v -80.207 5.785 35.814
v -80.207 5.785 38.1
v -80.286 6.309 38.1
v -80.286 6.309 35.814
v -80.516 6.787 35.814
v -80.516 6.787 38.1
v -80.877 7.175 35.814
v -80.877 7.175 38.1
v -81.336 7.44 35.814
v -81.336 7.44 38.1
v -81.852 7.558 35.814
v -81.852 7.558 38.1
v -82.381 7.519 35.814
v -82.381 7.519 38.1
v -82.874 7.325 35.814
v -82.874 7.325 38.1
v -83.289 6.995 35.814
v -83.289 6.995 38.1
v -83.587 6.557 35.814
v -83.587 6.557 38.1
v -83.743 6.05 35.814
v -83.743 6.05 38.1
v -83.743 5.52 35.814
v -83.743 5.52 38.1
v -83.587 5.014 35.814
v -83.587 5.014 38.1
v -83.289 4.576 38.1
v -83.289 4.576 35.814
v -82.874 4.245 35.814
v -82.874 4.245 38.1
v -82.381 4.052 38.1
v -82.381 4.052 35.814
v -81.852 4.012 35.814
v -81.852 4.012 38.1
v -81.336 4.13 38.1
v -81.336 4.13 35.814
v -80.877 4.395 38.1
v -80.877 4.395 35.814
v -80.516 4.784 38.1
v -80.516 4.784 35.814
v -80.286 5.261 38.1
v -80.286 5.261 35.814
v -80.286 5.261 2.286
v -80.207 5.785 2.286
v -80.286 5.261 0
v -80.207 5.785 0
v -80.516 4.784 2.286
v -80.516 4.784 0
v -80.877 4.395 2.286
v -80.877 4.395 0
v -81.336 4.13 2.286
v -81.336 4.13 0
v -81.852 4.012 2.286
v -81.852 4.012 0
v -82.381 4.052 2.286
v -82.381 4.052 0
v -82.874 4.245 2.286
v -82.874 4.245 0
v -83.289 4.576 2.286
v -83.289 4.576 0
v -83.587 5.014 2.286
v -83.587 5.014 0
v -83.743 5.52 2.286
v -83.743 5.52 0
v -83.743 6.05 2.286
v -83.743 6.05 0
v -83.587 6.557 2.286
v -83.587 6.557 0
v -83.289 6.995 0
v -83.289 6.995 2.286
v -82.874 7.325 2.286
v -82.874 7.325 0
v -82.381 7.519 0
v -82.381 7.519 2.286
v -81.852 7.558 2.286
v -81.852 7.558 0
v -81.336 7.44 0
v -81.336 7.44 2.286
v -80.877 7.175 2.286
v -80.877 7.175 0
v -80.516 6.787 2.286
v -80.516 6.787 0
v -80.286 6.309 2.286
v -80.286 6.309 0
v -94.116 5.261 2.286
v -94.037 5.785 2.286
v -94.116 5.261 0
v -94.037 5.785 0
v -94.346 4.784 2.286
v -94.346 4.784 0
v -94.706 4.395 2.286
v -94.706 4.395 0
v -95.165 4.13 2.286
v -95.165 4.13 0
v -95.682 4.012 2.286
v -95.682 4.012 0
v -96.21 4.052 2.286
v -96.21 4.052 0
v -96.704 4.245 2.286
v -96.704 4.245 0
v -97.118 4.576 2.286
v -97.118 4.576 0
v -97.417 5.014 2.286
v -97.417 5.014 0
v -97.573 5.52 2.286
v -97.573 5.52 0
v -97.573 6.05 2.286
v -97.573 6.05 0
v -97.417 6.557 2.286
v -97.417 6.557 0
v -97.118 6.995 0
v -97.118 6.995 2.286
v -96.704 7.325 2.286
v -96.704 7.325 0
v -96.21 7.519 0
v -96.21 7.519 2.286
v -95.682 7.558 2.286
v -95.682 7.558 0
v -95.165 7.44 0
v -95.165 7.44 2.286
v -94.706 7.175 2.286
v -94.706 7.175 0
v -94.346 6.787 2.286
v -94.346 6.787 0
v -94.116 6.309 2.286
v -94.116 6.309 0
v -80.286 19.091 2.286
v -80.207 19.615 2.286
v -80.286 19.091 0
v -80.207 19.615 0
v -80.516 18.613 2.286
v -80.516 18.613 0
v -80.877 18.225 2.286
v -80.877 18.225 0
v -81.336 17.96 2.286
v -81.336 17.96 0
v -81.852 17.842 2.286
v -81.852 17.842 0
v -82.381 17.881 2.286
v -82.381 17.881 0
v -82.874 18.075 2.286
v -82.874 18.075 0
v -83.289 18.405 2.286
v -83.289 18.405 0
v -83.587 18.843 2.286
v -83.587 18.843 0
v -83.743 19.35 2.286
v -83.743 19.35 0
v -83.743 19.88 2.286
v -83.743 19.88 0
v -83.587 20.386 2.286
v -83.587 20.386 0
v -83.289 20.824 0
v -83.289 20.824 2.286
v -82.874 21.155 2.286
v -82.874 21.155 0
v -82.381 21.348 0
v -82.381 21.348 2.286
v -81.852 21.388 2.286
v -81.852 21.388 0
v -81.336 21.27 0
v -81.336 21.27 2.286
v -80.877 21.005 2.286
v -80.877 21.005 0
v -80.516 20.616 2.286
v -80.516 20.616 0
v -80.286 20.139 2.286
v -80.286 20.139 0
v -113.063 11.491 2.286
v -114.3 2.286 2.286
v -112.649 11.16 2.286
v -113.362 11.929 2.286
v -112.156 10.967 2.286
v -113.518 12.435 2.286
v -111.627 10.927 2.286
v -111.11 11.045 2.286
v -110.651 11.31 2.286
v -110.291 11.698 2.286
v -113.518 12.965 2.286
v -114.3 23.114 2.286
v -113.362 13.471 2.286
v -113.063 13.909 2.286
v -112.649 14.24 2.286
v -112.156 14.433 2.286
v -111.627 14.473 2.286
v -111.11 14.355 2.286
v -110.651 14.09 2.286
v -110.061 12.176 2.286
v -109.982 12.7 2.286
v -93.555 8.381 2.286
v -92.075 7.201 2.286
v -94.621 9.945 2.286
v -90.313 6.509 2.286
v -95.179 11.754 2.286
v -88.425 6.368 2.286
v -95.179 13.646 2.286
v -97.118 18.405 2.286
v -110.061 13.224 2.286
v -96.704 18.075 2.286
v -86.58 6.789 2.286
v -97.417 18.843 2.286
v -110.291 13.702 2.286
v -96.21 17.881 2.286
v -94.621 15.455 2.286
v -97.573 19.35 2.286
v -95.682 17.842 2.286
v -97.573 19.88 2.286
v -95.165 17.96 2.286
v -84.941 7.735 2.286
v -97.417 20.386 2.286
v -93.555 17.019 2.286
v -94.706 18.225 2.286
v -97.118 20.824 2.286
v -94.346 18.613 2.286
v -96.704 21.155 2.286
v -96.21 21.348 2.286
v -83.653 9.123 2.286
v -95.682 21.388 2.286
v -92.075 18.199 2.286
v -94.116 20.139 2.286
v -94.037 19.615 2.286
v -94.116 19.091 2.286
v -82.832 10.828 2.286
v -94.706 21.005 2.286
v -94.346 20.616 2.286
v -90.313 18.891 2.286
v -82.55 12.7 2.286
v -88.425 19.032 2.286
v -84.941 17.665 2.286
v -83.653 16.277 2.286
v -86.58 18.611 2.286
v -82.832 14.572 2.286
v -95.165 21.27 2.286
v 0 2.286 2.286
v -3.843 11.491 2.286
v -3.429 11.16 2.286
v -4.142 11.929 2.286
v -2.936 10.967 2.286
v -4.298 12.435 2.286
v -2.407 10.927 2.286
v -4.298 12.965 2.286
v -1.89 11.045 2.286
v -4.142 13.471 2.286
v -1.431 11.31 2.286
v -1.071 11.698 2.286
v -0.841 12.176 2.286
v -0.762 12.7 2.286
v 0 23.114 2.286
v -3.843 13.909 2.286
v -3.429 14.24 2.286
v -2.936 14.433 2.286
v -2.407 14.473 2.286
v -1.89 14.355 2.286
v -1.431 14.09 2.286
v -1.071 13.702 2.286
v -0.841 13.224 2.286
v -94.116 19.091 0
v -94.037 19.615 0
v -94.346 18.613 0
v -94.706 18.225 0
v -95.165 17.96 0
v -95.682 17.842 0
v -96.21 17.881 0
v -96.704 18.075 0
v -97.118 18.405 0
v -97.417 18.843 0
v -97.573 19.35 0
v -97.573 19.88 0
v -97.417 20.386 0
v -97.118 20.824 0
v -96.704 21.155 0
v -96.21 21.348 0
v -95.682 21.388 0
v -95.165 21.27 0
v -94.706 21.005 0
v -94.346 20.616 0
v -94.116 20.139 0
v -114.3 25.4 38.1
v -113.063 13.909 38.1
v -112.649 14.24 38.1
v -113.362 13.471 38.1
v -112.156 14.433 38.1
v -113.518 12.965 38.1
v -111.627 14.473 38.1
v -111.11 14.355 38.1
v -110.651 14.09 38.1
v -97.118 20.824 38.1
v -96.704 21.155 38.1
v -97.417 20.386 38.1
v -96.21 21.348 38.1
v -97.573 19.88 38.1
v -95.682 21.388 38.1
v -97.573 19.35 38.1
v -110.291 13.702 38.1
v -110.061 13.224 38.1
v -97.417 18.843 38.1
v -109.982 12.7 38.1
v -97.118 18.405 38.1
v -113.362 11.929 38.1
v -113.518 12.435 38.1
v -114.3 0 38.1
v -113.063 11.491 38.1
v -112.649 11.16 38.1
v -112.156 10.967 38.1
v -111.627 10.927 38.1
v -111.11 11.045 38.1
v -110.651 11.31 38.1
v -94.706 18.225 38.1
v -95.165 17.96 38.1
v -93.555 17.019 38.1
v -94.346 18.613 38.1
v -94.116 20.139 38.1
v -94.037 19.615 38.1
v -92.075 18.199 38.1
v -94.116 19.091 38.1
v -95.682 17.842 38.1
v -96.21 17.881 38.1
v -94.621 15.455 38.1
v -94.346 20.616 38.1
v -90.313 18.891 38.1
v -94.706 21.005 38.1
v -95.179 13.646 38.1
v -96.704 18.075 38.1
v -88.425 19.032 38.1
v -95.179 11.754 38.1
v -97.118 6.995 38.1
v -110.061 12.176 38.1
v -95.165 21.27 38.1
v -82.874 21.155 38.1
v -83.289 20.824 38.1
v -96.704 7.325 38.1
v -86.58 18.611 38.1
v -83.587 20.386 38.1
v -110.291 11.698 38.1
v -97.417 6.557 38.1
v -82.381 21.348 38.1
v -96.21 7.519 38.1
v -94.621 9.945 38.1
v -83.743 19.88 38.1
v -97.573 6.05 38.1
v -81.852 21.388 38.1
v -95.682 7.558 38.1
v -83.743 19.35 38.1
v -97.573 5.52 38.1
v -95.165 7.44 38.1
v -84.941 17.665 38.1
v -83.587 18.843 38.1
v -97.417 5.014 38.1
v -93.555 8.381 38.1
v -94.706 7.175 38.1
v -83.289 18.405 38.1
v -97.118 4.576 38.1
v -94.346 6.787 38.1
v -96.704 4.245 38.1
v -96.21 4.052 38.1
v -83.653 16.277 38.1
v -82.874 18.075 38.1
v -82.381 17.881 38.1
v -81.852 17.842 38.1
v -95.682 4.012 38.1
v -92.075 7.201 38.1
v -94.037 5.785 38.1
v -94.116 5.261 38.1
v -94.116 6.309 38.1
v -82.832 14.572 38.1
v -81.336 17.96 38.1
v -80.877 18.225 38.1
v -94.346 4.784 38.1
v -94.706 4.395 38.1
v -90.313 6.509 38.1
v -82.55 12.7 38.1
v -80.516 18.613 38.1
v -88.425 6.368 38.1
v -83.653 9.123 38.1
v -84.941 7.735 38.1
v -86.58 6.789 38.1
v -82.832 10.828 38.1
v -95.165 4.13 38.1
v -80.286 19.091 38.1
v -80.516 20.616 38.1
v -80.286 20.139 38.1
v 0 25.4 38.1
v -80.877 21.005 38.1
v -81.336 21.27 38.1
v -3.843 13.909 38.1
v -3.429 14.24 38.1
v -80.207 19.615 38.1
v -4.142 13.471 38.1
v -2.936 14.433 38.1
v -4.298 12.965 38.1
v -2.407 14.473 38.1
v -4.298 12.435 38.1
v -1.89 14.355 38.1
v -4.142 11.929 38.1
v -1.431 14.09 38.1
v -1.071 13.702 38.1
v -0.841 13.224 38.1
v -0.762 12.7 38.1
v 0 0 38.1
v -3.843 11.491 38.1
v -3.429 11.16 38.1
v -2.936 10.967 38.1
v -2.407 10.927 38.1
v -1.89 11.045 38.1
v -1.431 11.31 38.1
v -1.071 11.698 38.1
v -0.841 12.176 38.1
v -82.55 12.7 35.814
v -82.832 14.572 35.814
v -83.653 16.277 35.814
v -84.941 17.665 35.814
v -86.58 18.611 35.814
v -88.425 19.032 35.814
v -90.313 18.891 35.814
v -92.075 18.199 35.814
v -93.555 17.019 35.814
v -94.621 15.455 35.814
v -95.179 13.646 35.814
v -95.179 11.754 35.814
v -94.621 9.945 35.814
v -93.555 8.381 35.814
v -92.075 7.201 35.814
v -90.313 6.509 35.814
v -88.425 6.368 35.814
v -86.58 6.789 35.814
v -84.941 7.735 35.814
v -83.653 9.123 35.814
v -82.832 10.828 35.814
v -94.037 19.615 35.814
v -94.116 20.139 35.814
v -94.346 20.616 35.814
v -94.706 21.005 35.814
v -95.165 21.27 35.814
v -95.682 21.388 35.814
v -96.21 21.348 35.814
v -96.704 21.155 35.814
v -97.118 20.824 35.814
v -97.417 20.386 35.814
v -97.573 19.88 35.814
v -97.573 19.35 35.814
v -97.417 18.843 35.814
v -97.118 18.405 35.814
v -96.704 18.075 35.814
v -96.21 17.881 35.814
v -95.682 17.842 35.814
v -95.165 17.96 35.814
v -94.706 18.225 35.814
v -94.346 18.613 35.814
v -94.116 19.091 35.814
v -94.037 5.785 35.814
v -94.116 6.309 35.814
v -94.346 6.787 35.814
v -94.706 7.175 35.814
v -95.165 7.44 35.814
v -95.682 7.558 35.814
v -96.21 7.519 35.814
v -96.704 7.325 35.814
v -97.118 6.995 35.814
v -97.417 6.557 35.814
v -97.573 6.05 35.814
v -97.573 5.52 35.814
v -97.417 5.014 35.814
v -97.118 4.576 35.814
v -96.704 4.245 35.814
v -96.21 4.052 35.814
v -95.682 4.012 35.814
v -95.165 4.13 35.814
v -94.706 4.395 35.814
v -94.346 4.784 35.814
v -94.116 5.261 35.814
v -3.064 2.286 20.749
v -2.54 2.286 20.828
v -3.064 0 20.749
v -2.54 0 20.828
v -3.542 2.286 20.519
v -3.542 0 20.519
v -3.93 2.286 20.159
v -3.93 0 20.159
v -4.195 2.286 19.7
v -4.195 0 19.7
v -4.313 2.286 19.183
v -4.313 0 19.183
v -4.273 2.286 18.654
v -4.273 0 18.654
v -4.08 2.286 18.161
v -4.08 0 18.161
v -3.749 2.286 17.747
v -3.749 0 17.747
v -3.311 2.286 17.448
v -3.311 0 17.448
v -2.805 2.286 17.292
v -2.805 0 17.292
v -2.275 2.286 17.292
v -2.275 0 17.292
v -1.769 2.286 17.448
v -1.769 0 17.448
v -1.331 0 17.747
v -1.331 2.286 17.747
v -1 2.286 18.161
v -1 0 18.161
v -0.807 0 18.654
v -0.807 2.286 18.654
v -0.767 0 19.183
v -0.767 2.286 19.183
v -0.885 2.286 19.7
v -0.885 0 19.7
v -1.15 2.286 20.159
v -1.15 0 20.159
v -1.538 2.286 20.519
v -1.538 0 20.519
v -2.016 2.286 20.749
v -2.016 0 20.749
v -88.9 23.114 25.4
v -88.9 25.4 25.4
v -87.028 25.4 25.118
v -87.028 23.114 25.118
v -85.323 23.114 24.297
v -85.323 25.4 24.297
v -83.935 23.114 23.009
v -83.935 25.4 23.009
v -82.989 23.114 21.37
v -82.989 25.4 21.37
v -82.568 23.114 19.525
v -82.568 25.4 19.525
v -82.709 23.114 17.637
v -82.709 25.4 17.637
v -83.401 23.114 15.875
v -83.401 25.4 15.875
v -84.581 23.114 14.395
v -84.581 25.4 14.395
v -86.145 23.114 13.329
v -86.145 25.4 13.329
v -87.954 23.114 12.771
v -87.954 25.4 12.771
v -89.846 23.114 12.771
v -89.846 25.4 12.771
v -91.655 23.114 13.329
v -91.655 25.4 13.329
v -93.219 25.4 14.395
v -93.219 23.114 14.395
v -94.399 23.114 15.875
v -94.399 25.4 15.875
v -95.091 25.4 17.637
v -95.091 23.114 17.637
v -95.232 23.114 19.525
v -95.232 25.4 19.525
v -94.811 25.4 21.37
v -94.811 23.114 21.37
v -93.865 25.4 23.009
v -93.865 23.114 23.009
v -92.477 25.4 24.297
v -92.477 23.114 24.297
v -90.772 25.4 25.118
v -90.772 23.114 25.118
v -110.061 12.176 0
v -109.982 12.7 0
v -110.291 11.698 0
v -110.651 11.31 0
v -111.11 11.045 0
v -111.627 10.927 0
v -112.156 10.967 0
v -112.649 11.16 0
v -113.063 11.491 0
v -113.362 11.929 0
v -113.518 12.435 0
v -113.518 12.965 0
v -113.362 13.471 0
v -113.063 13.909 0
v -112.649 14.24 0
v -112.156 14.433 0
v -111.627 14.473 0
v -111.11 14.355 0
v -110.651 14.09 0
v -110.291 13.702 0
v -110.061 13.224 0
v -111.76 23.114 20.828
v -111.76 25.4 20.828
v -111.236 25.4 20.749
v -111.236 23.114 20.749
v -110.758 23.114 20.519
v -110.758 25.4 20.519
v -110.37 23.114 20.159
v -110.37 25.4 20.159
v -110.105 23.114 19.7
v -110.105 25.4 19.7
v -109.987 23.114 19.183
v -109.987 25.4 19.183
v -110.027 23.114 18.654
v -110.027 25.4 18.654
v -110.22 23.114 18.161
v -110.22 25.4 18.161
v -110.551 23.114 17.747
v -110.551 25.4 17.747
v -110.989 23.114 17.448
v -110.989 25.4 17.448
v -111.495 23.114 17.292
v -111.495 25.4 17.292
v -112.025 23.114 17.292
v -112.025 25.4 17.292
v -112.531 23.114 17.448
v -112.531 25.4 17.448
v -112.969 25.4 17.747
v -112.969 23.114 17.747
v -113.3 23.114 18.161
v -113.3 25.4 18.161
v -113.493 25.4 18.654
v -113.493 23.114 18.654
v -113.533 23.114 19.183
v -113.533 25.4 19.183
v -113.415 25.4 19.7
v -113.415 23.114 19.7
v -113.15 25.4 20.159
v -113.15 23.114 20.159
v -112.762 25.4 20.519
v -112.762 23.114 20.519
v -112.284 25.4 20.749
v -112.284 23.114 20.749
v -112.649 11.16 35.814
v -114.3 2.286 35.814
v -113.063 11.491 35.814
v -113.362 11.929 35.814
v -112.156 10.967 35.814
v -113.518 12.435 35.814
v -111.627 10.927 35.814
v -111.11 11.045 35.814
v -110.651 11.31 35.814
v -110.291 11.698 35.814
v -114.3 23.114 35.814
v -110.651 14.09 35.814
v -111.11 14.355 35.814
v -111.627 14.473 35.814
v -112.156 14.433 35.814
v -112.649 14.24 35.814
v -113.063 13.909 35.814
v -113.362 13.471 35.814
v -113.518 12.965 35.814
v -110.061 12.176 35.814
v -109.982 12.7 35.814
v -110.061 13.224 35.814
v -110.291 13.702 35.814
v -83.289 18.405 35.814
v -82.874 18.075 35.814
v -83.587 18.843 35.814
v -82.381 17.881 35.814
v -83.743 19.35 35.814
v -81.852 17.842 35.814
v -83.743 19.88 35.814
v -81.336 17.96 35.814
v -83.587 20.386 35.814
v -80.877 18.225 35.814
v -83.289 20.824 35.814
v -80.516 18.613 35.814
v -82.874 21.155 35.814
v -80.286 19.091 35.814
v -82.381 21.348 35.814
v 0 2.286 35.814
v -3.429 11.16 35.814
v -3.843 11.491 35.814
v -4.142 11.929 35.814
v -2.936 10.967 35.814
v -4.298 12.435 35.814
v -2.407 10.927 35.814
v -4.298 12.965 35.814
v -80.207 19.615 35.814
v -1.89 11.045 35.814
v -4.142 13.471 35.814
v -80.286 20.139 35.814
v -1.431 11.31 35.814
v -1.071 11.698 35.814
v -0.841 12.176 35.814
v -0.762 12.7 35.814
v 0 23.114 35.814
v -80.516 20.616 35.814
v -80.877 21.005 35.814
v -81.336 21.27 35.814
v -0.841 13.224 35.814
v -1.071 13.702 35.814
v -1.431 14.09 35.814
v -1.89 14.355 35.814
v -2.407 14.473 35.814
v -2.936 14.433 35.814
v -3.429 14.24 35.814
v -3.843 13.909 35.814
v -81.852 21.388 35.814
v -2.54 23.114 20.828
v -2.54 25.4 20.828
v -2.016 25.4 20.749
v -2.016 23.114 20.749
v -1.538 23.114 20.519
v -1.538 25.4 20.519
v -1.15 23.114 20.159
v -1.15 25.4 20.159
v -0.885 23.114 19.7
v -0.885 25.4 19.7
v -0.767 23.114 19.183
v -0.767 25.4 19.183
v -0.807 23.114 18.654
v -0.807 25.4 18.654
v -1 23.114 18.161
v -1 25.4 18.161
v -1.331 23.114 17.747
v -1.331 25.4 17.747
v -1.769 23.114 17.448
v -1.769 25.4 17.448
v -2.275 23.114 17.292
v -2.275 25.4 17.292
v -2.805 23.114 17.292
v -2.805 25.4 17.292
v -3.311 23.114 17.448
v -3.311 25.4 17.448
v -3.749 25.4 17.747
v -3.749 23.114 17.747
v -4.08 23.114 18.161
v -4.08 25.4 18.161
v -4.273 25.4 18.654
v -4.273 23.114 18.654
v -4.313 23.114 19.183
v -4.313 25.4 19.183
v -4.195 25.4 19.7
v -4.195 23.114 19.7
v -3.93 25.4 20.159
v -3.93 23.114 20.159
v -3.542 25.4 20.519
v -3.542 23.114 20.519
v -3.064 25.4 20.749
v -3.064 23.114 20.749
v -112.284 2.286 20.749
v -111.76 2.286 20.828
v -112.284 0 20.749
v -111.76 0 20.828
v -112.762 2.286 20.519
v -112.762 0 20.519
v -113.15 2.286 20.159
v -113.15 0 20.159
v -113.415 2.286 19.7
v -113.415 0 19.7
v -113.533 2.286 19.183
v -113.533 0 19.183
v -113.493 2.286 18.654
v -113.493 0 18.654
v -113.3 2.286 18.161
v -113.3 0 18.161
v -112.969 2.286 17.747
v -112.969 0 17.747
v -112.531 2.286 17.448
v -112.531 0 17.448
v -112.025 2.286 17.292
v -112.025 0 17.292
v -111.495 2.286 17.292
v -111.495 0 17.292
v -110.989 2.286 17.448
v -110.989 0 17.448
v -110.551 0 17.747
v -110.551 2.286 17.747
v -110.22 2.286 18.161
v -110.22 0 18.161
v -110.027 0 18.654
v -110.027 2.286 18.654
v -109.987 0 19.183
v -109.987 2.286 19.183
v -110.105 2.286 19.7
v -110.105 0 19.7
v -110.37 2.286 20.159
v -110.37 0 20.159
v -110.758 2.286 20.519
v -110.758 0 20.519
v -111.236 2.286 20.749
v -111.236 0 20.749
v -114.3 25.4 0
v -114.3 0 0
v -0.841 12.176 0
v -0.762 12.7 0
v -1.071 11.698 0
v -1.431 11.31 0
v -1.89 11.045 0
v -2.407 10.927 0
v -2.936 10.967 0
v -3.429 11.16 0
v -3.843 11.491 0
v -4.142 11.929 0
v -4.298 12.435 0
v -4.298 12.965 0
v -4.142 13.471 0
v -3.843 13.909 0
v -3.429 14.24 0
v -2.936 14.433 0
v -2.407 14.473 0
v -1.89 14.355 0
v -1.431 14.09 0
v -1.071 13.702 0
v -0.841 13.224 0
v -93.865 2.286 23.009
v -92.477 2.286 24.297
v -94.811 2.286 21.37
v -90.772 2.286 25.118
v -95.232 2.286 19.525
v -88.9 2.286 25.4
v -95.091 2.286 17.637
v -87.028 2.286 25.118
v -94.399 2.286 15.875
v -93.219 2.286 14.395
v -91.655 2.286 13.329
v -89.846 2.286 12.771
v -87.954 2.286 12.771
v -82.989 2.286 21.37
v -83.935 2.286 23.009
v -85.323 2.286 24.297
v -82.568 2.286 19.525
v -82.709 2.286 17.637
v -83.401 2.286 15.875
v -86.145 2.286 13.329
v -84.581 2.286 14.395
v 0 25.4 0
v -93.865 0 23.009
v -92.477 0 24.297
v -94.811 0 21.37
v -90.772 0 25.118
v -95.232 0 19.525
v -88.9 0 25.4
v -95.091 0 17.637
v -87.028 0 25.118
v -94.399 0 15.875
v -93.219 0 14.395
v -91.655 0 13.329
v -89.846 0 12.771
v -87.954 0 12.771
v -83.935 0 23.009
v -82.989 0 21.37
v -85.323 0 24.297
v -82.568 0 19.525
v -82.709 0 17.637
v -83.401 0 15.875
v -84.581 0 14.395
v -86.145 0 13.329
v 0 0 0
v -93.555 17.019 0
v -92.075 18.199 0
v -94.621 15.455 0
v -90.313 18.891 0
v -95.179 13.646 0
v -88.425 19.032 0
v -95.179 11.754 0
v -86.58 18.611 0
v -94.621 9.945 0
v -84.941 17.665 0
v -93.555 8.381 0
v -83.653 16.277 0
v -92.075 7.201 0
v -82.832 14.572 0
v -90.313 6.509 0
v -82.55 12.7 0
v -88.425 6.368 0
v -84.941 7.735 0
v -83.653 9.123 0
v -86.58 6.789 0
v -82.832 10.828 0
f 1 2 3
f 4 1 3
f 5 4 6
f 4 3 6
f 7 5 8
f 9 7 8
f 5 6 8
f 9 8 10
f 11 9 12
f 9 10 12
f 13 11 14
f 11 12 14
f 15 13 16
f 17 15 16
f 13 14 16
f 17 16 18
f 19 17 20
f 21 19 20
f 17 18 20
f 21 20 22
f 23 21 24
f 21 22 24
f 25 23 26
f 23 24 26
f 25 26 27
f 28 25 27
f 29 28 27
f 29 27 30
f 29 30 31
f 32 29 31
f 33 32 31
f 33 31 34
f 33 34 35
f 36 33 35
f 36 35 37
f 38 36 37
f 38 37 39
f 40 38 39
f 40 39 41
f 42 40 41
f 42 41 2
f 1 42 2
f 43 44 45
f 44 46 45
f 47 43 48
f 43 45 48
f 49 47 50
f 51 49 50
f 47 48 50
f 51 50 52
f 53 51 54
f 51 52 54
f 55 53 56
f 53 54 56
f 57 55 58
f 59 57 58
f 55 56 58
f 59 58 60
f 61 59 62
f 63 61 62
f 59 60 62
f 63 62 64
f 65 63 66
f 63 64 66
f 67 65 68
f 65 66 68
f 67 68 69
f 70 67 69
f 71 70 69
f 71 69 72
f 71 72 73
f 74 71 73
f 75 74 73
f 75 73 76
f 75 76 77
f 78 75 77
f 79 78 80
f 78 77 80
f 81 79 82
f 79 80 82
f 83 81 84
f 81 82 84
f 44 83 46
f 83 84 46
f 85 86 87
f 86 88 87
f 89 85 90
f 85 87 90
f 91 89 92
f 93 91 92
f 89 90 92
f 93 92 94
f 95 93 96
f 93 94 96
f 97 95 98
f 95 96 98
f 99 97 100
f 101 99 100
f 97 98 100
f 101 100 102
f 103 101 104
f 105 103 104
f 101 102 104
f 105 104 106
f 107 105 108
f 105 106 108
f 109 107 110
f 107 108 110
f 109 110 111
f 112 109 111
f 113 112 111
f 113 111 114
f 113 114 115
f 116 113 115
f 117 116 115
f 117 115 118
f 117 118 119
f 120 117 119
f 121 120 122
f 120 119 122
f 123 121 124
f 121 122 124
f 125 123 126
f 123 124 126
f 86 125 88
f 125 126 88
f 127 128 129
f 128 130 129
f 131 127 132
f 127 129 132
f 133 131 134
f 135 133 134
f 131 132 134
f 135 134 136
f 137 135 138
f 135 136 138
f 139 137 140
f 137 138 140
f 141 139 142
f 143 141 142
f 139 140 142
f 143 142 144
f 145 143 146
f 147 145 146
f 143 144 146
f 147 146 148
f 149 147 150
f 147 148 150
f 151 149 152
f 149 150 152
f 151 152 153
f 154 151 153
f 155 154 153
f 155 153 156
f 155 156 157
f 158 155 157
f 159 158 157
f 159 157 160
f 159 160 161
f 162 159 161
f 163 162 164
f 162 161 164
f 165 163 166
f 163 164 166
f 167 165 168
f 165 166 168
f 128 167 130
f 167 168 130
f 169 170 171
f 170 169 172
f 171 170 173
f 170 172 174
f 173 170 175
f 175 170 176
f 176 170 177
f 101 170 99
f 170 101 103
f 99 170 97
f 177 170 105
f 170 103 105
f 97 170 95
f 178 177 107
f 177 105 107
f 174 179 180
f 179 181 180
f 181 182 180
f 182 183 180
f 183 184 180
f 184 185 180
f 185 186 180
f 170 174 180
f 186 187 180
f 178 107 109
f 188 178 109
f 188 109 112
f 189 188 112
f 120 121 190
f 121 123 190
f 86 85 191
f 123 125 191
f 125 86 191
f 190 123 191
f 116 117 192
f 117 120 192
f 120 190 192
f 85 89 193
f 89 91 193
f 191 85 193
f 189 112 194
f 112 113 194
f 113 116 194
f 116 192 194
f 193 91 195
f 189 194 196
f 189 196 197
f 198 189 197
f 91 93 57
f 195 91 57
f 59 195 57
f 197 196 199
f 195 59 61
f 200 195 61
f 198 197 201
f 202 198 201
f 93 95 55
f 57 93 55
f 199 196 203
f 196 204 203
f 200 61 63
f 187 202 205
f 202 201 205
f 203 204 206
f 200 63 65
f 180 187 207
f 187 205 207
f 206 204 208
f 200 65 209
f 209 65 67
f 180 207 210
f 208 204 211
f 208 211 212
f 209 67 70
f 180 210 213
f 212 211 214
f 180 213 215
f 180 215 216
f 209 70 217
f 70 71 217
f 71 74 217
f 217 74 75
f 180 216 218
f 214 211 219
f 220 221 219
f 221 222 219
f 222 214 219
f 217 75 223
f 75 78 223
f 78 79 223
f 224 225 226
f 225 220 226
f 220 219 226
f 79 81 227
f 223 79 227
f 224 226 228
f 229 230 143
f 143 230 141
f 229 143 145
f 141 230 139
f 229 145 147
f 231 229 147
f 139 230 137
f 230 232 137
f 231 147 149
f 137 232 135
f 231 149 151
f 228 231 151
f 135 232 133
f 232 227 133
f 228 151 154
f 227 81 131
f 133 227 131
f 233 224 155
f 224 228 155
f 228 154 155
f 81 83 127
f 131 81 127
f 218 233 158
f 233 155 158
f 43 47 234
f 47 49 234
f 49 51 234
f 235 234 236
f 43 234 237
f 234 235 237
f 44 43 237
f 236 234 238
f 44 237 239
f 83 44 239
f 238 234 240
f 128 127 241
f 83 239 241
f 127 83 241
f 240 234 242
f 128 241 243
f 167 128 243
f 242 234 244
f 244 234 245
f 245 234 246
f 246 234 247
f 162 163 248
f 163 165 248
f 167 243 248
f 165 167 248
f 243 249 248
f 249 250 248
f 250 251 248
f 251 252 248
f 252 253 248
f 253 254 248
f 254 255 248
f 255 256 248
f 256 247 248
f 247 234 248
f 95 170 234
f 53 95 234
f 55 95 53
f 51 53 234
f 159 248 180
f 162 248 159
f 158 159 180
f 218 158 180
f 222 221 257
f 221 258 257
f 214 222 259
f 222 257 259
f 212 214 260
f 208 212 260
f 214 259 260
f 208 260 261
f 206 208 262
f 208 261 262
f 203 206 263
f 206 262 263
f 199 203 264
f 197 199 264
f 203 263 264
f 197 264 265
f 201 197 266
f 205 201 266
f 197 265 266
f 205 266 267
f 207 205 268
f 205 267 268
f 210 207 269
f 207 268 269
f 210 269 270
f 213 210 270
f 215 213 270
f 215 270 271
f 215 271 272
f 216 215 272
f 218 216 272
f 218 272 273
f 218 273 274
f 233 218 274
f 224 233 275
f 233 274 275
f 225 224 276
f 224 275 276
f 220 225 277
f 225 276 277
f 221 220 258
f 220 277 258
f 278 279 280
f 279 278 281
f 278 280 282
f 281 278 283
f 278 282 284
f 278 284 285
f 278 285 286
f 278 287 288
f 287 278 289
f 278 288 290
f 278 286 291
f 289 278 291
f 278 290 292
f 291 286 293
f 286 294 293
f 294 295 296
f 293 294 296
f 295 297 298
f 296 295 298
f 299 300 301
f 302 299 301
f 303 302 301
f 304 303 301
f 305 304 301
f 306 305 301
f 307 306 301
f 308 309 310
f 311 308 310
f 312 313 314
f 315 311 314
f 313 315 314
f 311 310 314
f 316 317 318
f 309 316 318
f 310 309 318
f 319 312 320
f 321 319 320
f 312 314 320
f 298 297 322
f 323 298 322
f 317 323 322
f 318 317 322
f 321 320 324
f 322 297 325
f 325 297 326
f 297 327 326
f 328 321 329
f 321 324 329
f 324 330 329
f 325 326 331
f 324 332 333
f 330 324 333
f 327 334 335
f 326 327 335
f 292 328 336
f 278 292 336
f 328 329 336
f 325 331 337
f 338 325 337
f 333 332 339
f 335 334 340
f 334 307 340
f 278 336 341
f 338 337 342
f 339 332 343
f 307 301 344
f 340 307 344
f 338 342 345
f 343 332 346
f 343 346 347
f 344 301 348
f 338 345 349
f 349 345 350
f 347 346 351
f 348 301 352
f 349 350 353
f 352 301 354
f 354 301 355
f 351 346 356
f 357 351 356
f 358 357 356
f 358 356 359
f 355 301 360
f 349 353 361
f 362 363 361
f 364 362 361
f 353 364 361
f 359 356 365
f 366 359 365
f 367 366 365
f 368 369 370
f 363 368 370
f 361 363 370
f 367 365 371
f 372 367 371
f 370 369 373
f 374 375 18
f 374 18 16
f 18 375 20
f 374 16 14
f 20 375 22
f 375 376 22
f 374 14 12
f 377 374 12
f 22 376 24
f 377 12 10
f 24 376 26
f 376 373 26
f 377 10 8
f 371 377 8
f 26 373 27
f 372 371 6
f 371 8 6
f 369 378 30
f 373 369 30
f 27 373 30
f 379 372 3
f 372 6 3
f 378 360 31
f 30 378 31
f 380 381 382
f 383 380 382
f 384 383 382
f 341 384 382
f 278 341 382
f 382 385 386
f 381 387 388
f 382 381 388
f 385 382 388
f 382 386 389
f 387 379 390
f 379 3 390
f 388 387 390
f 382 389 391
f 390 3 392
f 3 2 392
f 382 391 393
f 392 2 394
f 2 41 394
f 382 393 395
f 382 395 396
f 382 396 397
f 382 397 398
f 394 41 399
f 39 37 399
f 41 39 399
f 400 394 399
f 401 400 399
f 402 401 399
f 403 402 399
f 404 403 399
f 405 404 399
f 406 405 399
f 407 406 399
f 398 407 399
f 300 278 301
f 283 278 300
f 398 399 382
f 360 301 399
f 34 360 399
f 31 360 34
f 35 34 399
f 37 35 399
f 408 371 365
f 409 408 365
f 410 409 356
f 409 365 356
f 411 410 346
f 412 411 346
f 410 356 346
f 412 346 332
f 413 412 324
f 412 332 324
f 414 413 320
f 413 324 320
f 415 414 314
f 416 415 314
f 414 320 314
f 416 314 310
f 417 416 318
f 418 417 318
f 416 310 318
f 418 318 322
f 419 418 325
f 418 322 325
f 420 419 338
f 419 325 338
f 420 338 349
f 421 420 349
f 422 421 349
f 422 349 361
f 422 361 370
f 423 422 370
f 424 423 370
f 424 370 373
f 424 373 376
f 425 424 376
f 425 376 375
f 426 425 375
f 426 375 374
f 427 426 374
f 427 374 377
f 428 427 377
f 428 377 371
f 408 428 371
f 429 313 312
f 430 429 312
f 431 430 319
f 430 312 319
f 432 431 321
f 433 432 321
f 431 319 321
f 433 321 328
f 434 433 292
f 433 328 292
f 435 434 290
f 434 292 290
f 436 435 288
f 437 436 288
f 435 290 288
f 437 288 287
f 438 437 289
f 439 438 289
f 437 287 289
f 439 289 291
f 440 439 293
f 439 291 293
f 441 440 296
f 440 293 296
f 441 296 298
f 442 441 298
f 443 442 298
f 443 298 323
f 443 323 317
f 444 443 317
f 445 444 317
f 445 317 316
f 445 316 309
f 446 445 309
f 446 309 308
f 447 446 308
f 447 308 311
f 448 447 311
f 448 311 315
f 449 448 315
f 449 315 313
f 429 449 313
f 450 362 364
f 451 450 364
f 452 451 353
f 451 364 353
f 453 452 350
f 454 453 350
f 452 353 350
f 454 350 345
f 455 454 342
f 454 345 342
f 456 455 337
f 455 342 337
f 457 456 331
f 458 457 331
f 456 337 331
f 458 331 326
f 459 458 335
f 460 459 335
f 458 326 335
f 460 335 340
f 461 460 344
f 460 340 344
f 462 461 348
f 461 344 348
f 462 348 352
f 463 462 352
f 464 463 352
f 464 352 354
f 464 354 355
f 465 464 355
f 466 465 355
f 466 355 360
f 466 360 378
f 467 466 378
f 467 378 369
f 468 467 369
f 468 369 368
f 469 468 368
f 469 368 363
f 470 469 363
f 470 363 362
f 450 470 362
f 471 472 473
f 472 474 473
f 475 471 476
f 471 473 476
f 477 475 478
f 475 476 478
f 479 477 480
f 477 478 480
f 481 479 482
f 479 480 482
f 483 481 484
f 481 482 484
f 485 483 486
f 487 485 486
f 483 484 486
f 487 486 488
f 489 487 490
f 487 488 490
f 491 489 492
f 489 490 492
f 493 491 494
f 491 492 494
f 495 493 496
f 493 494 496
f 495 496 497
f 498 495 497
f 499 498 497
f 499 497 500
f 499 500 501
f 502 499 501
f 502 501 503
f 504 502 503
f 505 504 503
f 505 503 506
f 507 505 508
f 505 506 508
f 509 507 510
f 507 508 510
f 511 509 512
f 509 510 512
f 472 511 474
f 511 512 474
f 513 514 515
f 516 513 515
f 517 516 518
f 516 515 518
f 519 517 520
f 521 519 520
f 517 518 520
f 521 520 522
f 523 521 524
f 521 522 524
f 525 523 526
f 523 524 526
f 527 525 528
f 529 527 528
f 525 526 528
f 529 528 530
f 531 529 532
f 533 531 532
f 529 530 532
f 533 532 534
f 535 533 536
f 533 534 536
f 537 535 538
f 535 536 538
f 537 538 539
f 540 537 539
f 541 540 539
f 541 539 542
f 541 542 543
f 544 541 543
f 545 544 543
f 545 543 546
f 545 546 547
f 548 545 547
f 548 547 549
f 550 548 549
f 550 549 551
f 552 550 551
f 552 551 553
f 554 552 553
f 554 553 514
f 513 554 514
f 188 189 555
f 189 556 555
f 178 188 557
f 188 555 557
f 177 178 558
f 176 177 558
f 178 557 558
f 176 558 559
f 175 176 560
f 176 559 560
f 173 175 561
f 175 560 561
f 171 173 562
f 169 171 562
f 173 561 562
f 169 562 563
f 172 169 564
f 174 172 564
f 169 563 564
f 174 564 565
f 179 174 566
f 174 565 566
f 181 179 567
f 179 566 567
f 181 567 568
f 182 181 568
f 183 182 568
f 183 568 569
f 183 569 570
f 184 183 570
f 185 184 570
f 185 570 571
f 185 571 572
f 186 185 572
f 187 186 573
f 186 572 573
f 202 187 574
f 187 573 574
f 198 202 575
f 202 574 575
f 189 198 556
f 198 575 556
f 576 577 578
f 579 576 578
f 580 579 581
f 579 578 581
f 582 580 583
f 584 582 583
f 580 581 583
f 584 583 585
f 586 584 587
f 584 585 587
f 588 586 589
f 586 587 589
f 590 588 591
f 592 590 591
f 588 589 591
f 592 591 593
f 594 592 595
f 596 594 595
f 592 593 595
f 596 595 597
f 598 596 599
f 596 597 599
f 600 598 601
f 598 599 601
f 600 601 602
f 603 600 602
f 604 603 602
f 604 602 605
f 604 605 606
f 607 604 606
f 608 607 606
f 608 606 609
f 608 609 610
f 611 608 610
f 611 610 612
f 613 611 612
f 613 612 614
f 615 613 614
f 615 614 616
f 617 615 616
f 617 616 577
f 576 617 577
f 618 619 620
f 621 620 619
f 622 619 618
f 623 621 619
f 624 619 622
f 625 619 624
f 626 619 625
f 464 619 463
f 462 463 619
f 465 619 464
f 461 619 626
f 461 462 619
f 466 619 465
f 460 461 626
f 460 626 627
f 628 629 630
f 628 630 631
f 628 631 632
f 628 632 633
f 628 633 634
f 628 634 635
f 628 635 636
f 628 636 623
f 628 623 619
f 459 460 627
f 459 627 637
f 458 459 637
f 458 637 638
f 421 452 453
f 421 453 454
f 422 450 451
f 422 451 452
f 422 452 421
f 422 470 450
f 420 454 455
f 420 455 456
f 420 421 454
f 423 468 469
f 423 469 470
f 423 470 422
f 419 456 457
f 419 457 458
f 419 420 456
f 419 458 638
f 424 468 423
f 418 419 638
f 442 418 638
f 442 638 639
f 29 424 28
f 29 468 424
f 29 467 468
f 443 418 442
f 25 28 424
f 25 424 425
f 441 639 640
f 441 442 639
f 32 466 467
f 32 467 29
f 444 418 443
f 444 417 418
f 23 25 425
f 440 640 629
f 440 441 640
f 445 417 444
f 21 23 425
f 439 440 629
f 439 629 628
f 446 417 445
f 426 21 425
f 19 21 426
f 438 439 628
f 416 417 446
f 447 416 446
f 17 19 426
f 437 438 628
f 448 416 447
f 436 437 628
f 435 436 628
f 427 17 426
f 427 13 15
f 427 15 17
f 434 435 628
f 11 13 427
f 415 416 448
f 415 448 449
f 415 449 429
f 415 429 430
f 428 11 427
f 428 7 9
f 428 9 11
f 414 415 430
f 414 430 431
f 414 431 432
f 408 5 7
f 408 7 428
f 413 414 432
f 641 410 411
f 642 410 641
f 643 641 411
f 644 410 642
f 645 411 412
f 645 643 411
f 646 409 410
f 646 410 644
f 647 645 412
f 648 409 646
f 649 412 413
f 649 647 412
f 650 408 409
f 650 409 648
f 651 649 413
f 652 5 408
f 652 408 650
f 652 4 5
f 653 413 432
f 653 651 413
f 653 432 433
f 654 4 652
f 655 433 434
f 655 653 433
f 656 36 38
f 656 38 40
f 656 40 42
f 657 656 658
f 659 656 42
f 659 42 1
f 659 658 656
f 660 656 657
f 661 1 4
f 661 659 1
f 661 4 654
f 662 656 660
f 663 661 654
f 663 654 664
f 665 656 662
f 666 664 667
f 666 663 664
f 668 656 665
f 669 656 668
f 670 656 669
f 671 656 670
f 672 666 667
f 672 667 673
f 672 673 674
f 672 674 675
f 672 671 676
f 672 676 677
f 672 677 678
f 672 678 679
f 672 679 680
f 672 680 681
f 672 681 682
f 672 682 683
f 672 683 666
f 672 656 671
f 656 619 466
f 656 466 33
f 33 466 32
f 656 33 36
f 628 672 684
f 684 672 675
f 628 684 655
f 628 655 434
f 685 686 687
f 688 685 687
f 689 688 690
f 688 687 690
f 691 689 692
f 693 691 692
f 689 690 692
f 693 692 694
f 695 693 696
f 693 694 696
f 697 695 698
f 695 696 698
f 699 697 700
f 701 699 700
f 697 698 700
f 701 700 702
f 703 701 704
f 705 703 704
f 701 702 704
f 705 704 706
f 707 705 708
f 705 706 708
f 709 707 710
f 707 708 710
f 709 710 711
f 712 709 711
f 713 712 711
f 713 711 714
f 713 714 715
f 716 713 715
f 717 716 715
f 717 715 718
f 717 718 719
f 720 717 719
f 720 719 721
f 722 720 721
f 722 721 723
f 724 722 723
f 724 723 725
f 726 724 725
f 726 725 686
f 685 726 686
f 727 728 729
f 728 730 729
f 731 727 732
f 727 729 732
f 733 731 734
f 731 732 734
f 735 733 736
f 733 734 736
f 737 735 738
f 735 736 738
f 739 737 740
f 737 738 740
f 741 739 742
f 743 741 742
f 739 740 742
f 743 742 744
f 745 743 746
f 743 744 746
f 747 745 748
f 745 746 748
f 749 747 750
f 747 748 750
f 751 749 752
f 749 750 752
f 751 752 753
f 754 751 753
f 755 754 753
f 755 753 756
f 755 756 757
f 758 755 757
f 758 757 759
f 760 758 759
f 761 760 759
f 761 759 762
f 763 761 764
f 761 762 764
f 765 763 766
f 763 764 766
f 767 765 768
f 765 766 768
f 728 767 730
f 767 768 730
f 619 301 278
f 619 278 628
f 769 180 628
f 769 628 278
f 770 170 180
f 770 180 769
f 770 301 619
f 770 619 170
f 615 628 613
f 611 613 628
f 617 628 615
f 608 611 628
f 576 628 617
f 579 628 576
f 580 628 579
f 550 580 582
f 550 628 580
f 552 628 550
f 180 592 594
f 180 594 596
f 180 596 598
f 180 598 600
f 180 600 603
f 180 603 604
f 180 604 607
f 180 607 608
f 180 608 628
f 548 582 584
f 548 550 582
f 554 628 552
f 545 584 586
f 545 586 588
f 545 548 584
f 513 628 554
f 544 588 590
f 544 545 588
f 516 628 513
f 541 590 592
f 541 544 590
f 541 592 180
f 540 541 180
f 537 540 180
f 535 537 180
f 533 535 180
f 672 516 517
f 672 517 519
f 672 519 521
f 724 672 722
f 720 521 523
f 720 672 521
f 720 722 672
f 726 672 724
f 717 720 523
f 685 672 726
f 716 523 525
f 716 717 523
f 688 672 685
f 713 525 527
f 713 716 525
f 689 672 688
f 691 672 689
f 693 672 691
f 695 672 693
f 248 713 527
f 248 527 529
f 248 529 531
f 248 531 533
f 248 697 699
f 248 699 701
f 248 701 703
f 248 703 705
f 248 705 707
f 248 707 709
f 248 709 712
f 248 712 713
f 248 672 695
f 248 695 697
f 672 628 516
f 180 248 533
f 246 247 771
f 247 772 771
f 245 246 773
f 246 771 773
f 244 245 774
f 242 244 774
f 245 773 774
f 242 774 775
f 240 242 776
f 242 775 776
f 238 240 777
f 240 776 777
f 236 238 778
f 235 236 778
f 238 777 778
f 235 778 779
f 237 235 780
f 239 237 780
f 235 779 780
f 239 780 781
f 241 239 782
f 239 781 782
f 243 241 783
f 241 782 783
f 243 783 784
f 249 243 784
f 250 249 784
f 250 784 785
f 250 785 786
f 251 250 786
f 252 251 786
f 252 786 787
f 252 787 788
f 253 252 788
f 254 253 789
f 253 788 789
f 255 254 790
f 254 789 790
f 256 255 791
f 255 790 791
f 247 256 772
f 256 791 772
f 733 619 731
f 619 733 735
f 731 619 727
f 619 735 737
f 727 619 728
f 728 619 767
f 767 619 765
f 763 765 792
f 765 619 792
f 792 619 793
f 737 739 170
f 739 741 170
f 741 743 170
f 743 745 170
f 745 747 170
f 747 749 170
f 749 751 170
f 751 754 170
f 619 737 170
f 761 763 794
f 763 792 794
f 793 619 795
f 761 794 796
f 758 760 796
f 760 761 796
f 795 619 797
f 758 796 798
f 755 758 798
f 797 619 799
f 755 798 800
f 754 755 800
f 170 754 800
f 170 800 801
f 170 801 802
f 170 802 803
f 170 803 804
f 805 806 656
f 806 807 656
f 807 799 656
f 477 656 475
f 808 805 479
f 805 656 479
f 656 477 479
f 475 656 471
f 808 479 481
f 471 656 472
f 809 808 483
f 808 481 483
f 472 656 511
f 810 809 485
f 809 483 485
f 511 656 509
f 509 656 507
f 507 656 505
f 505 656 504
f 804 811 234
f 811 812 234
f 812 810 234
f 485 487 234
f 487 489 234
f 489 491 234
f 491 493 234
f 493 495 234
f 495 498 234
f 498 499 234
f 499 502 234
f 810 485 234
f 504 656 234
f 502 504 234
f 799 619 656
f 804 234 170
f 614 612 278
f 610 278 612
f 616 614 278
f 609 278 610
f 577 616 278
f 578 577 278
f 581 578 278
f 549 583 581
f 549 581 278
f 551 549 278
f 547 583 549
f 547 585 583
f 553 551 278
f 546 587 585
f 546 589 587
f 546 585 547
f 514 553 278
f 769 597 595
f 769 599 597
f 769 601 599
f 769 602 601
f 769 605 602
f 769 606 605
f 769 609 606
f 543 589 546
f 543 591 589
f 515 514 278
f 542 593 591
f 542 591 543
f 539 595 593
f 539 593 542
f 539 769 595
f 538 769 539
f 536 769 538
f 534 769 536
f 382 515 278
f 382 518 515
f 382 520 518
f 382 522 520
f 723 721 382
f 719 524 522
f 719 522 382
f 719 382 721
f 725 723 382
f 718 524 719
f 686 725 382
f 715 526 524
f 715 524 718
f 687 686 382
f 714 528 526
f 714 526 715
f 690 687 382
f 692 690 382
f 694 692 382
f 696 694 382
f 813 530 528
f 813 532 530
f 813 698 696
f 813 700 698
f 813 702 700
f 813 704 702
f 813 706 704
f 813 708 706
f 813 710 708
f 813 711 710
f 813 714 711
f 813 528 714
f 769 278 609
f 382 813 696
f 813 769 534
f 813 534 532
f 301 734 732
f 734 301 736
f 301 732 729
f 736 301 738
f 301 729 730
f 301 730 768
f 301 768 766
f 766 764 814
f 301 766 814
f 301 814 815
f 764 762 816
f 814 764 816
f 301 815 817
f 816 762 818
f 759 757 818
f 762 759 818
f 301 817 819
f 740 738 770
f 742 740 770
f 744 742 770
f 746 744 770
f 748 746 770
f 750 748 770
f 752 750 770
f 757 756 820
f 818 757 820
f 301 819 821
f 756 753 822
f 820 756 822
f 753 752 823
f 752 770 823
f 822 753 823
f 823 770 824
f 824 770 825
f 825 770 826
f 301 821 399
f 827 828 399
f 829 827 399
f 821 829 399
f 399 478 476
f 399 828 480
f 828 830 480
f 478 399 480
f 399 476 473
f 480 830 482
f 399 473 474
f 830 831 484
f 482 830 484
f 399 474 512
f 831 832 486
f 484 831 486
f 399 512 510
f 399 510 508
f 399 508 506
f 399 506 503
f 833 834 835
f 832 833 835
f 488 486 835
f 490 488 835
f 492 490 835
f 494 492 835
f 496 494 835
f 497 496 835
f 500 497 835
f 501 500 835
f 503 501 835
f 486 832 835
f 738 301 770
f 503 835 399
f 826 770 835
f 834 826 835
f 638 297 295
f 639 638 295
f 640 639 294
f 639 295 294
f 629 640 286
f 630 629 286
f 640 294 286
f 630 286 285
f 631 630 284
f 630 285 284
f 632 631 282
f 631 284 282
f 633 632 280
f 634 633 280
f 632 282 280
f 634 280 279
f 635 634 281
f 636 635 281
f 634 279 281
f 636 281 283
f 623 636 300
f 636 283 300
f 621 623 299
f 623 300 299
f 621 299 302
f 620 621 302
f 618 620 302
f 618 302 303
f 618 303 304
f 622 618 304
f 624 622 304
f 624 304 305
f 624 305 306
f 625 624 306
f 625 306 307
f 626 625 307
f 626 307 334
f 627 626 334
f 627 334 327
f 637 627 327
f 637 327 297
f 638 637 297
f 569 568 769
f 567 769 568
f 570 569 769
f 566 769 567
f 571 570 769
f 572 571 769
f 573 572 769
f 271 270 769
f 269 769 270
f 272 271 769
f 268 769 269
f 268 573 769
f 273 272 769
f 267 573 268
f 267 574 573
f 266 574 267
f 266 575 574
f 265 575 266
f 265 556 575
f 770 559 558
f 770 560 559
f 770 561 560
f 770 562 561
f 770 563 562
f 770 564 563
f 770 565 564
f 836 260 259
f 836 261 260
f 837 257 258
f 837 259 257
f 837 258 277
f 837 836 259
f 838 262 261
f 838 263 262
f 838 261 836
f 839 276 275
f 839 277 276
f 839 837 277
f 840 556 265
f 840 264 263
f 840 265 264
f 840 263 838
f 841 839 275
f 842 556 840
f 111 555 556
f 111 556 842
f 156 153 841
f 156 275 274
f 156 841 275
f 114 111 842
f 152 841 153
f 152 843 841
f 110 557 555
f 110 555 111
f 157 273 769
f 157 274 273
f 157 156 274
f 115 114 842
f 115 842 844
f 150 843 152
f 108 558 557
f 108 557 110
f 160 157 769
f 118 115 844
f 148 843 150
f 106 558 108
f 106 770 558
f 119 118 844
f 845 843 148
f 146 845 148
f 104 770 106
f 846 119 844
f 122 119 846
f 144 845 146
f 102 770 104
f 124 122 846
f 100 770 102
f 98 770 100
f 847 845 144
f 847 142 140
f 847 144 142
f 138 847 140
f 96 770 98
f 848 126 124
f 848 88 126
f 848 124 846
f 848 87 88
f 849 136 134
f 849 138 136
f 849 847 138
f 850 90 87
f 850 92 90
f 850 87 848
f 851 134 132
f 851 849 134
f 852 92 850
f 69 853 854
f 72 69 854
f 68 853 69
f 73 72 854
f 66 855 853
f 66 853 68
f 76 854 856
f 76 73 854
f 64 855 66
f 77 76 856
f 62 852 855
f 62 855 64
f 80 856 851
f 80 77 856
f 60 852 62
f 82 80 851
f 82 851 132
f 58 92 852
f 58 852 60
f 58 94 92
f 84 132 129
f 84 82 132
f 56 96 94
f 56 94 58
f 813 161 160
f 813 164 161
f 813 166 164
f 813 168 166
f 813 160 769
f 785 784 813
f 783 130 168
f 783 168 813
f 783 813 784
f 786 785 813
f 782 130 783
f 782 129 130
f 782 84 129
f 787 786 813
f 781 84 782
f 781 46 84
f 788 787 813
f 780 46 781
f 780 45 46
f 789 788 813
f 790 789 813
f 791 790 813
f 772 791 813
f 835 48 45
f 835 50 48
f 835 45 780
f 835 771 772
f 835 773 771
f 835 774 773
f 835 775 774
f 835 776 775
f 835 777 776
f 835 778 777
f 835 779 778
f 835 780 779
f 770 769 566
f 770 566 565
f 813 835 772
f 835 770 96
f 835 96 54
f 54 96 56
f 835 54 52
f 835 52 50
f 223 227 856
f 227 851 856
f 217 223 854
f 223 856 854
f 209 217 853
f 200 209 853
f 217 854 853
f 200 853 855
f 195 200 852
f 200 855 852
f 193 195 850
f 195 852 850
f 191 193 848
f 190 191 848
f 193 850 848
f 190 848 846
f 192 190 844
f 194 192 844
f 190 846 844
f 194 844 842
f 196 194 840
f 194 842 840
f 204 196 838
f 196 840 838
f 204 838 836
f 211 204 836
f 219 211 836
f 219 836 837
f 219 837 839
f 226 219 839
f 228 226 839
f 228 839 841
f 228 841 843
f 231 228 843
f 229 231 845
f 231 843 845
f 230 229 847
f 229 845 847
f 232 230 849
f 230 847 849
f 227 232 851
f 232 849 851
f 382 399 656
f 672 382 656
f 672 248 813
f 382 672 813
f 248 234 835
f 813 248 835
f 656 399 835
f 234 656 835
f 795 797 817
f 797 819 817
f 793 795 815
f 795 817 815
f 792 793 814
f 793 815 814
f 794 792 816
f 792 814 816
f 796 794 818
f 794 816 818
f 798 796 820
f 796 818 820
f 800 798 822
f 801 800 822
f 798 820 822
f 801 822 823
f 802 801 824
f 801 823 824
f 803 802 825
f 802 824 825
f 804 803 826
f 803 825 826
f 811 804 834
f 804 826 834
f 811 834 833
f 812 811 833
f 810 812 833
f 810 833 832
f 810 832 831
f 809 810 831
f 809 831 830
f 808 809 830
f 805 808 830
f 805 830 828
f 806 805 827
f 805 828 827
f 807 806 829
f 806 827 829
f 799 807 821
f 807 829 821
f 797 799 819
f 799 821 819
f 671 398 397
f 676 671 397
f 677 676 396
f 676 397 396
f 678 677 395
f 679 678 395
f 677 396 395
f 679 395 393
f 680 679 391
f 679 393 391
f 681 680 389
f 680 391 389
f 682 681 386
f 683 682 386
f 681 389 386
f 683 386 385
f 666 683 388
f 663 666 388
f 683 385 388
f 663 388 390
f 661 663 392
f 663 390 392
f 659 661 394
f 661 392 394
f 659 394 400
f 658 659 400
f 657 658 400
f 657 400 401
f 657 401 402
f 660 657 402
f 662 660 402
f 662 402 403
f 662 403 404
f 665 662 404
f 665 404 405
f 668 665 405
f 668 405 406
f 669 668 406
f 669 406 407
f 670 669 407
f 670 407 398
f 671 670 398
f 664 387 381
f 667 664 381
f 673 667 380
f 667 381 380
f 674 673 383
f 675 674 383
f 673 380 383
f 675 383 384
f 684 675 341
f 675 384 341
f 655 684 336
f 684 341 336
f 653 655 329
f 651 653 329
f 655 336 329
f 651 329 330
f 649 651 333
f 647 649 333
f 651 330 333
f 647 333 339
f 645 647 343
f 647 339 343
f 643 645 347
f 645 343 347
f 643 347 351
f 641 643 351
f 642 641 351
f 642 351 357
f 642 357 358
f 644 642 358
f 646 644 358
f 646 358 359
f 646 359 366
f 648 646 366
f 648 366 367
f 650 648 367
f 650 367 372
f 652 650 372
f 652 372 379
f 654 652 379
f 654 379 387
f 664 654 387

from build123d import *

# Parameters (mm, degrees)
SKETCH1_W           = 114.3
SKETCH1_H           = 38.1
BOSS_EXTRUDE1_DEPTH = 25.4
CUT_EXTRUDE1_REACH  = 125.131
SKETCH2_W           = 33.528
SKETCH2_H           = 20.828
CUT_EXTRUDE2_REACH  = 125.131
SKETCH3_R           = 1.778
CUT_EXTRUDE3_REACH  = 125.131
SKETCH4_R           = 1.778
CUT_EXTRUDE4_REACH  = 125.131
SKETCH5_R           = 1.778
SKETCH5_R_2         = 6.35
CUT_EXTRUDE5_REACH  = 125.131
SKETCH6_R           = 1.778
SKETCH6_R_2         = 6.35
CUT_EXTRUDE6_REACH  = 125.131
SKETCH7_R           = 1.778
SKETCH7_R_2         = 6.35
CUT_EXTRUDE7_REACH  = 125.131
SKETCH8_R           = 1.778
SKETCH8_R_2         = 6.35
CUT_EXTRUDE8_REACH  = 125.131
SKETCH9_R           = 1.778
CUT_EXTRUDE9_REACH  = 125.131
SKETCH10_R          = 1.778


with BuildPart() as part:
    # Sketch1 → Boss-Extrude1 (new body)
    with BuildSketch(Plane(origin=(0, 0, 0), x_dir=(1, 0, 0), z_dir=(0, 1, 0))):
        with Locations((-57.15, -19.05)):
            Rectangle(SKETCH1_W, SKETCH1_H)
    extrude(amount=BOSS_EXTRUDE1_DEPTH)

    # Sketch2 → Cut-Extrude1 (cut, up to next)
    with BuildSketch(Plane(origin=(0, 0, 0), x_dir=(0, 0, -1), z_dir=(1, 0, 0)), mode=Mode.PRIVATE) as cut_extrude1_sk1:
        with Locations((-19.05, 12.7)):
            Rectangle(SKETCH2_W, SKETCH2_H)
    cut_extrude1_tool1 = extrude(cut_extrude1_sk1.sketch, amount=-CUT_EXTRUDE1_REACH, mode=Mode.PRIVATE) & part.part
    add(cut_extrude1_tool1.solids().sort_by_distance((0, 12.7, 19.05))[0], mode=Mode.SUBTRACT)

    # Sketch3 → Cut-Extrude2 (cut, up to next)
    with BuildSketch(Plane.XY.offset(38.1), mode=Mode.PRIVATE) as cut_extrude2_sk1:
        with Locations((-2.54, 12.7)):
            Circle(SKETCH3_R)
    cut_extrude2_tool1 = extrude(cut_extrude2_sk1.sketch, amount=-CUT_EXTRUDE2_REACH, mode=Mode.PRIVATE) & part.part
    add(cut_extrude2_tool1.solids().sort_by_distance((-2.54, 12.7, 38.1))[0], mode=Mode.SUBTRACT)

    # Sketch4 → Cut-Extrude3 (cut, up to next)
    with BuildSketch(Plane(origin=(0, 0, 0), x_dir=(-1, 0, 0), z_dir=(0, 0, -1)), mode=Mode.PRIVATE) as cut_extrude3_sk1:
        with Locations(Location((2.54, 12.7, 0), (0, 0, 180))):
            Circle(SKETCH4_R)
    cut_extrude3_tool1 = extrude(cut_extrude3_sk1.sketch, amount=-CUT_EXTRUDE3_REACH, mode=Mode.PRIVATE) & part.part
    add(cut_extrude3_tool1.solids().sort_by_distance((-2.54, 12.7, 0))[0], mode=Mode.SUBTRACT)

    # Sketch5 → Cut-Extrude4 (cut, up to next)
    with BuildSketch(Plane.XY.offset(38.1), mode=Mode.PRIVATE) as cut_extrude4_sk1:
        with Locations((-111.76, 12.7)):
            Circle(SKETCH5_R)
    cut_extrude4_tool1 = extrude(cut_extrude4_sk1.sketch, amount=-CUT_EXTRUDE4_REACH, mode=Mode.PRIVATE) & part.part
    # Sketch5 → Cut-Extrude4 (cut, up to next)
    with BuildSketch(Plane.XY.offset(38.1), mode=Mode.PRIVATE) as cut_extrude4_sk2:
        with Locations((-88.9, 12.7)):
            Circle(SKETCH5_R_2)
    cut_extrude4_tool2 = extrude(cut_extrude4_sk2.sketch, amount=-CUT_EXTRUDE4_REACH, mode=Mode.PRIVATE) & part.part
    # Sketch5 → Cut-Extrude4 (cut, up to next)
    with BuildSketch(Plane.XY.offset(38.1), mode=Mode.PRIVATE) as cut_extrude4_sk3:
        with Locations((-95.814797213, 19.614797213)):
            Circle(SKETCH5_R)
    cut_extrude4_tool3 = extrude(cut_extrude4_sk3.sketch, amount=-CUT_EXTRUDE4_REACH, mode=Mode.PRIVATE) & part.part
    # Sketch5 → Cut-Extrude4 (cut, up to next)
    with BuildSketch(Plane.XY.offset(38.1), mode=Mode.PRIVATE) as cut_extrude4_sk4:
        with Locations((-81.985202787, 19.614797213)):
            Circle(SKETCH5_R)
    cut_extrude4_tool4 = extrude(cut_extrude4_sk4.sketch, amount=-CUT_EXTRUDE4_REACH, mode=Mode.PRIVATE) & part.part
    # Sketch5 → Cut-Extrude4 (cut, up to next)
    with BuildSketch(Plane.XY.offset(38.1), mode=Mode.PRIVATE) as cut_extrude4_sk5:
        with Locations((-95.814797213, 5.785202787)):
            Circle(SKETCH5_R)
    cut_extrude4_tool5 = extrude(cut_extrude4_sk5.sketch, amount=-CUT_EXTRUDE4_REACH, mode=Mode.PRIVATE) & part.part
    # Sketch5 → Cut-Extrude4 (cut, up to next)
    with BuildSketch(Plane.XY.offset(38.1), mode=Mode.PRIVATE) as cut_extrude4_sk6:
        with Locations((-81.985202787, 5.785202787)):
            Circle(SKETCH5_R)
    cut_extrude4_tool6 = extrude(cut_extrude4_sk6.sketch, amount=-CUT_EXTRUDE4_REACH, mode=Mode.PRIVATE) & part.part
    add(cut_extrude4_tool1.solids().sort_by_distance((-111.76, 12.7, 38.1))[0], mode=Mode.SUBTRACT)
    add(cut_extrude4_tool2.solids().sort_by_distance((-88.9, 12.7, 38.1))[0], mode=Mode.SUBTRACT)
    add(cut_extrude4_tool3.solids().sort_by_distance((-95.814797, 19.614797, 38.1))[0], mode=Mode.SUBTRACT)
    add(cut_extrude4_tool4.solids().sort_by_distance((-81.985203, 19.614797, 38.1))[0], mode=Mode.SUBTRACT)
    add(cut_extrude4_tool5.solids().sort_by_distance((-95.814797, 5.785203, 38.1))[0], mode=Mode.SUBTRACT)
    add(cut_extrude4_tool6.solids().sort_by_distance((-81.985203, 5.785203, 38.1))[0], mode=Mode.SUBTRACT)

    # Sketch6 → Cut-Extrude5 (cut, up to next)
    with BuildSketch(Plane(origin=(0, 0, 0), x_dir=(-1, 0, 0), z_dir=(0, 0, -1)), mode=Mode.PRIVATE) as cut_extrude5_sk1:
        with Locations(Location((111.76, 12.7, 0), (0, 0, 180))):
            Circle(SKETCH6_R)
    cut_extrude5_tool1 = extrude(cut_extrude5_sk1.sketch, amount=-CUT_EXTRUDE5_REACH, mode=Mode.PRIVATE) & part.part
    # Sketch6 → Cut-Extrude5 (cut, up to next)
    with BuildSketch(Plane(origin=(0, 0, 0), x_dir=(-1, 0, 0), z_dir=(0, 0, -1)), mode=Mode.PRIVATE) as cut_extrude5_sk2:
        with Locations(Location((88.9, 12.7, 0), (0, 0, 180))):
            Circle(SKETCH6_R_2)
    cut_extrude5_tool2 = extrude(cut_extrude5_sk2.sketch, amount=-CUT_EXTRUDE5_REACH, mode=Mode.PRIVATE) & part.part
    # Sketch6 → Cut-Extrude5 (cut, up to next)
    with BuildSketch(Plane(origin=(0, 0, 0), x_dir=(-1, 0, 0), z_dir=(0, 0, -1)), mode=Mode.PRIVATE) as cut_extrude5_sk3:
        with Locations(Location((81.985202787, 19.614797213, 0), (0, 0, 180))):
            Circle(SKETCH6_R)
    cut_extrude5_tool3 = extrude(cut_extrude5_sk3.sketch, amount=-CUT_EXTRUDE5_REACH, mode=Mode.PRIVATE) & part.part
    # Sketch6 → Cut-Extrude5 (cut, up to next)
    with BuildSketch(Plane(origin=(0, 0, 0), x_dir=(-1, 0, 0), z_dir=(0, 0, -1)), mode=Mode.PRIVATE) as cut_extrude5_sk4:
        with Locations(Location((95.814797213, 19.614797213, 0), (0, 0, 180))):
            Circle(SKETCH6_R)
    cut_extrude5_tool4 = extrude(cut_extrude5_sk4.sketch, amount=-CUT_EXTRUDE5_REACH, mode=Mode.PRIVATE) & part.part
    # Sketch6 → Cut-Extrude5 (cut, up to next)
    with BuildSketch(Plane(origin=(0, 0, 0), x_dir=(-1, 0, 0), z_dir=(0, 0, -1)), mode=Mode.PRIVATE) as cut_extrude5_sk5:
        with Locations(Location((95.814797213, 5.785202787, 0), (0, 0, 180))):
            Circle(SKETCH6_R)
    cut_extrude5_tool5 = extrude(cut_extrude5_sk5.sketch, amount=-CUT_EXTRUDE5_REACH, mode=Mode.PRIVATE) & part.part
    # Sketch6 → Cut-Extrude5 (cut, up to next)
    with BuildSketch(Plane(origin=(0, 0, 0), x_dir=(-1, 0, 0), z_dir=(0, 0, -1)), mode=Mode.PRIVATE) as cut_extrude5_sk6:
        with Locations(Location((81.985202787, 5.785202787, 0), (0, 0, 180))):
            Circle(SKETCH6_R)
    cut_extrude5_tool6 = extrude(cut_extrude5_sk6.sketch, amount=-CUT_EXTRUDE5_REACH, mode=Mode.PRIVATE) & part.part
    add(cut_extrude5_tool1.solids().sort_by_distance((-111.76, 12.7, 0))[0], mode=Mode.SUBTRACT)
    add(cut_extrude5_tool2.solids().sort_by_distance((-88.9, 12.7, 0))[0], mode=Mode.SUBTRACT)
    add(cut_extrude5_tool3.solids().sort_by_distance((-81.985203, 19.614797, 0))[0], mode=Mode.SUBTRACT)
    add(cut_extrude5_tool4.solids().sort_by_distance((-95.814797, 19.614797, 0))[0], mode=Mode.SUBTRACT)
    add(cut_extrude5_tool5.solids().sort_by_distance((-95.814797, 5.785203, 0))[0], mode=Mode.SUBTRACT)
    add(cut_extrude5_tool6.solids().sort_by_distance((-81.985203, 5.785203, 0))[0], mode=Mode.SUBTRACT)

    # Sketch7 → Cut-Extrude6 (cut, up to next)
    with BuildSketch(Plane(origin=(0, 25.4, 0), x_dir=(1, 0, 0), z_dir=(0, 1, 0)), mode=Mode.PRIVATE) as cut_extrude6_sk1:
        with Locations(Location((-111.76, -19.05, 0), (0, 0, 270))):
            Circle(SKETCH7_R)
    cut_extrude6_tool1 = extrude(cut_extrude6_sk1.sketch, amount=-CUT_EXTRUDE6_REACH, mode=Mode.PRIVATE) & part.part
    # Sketch7 → Cut-Extrude6 (cut, up to next)
    with BuildSketch(Plane(origin=(0, 25.4, 0), x_dir=(1, 0, 0), z_dir=(0, 1, 0)), mode=Mode.PRIVATE) as cut_extrude6_sk2:
        with Locations(Location((-88.9, -19.05, 0), (0, 0, 270))):
            Circle(SKETCH7_R_2)
    cut_extrude6_tool2 = extrude(cut_extrude6_sk2.sketch, amount=-CUT_EXTRUDE6_REACH, mode=Mode.PRIVATE) & part.part
    add(cut_extrude6_tool1.solids().sort_by_distance((-111.76, 25.4, 19.05))[0], mode=Mode.SUBTRACT)
    add(cut_extrude6_tool2.solids().sort_by_distance((-88.9, 25.4, 19.05))[0], mode=Mode.SUBTRACT)

    # Sketch8 → Cut-Extrude7 (cut, up to next)
    with BuildSketch(Plane.XZ, mode=Mode.PRIVATE) as cut_extrude7_sk1:
        with Locations(Location((-111.76, 19.05, 0), (0, 0, 90))):
            Circle(SKETCH8_R)
    cut_extrude7_tool1 = extrude(cut_extrude7_sk1.sketch, amount=-CUT_EXTRUDE7_REACH, mode=Mode.PRIVATE) & part.part
    # Sketch8 → Cut-Extrude7 (cut, up to next)
    with BuildSketch(Plane.XZ, mode=Mode.PRIVATE) as cut_extrude7_sk2:
        with Locations(Location((-88.9, 19.05, 0), (0, 0, 90))):
            Circle(SKETCH8_R_2)
    cut_extrude7_tool2 = extrude(cut_extrude7_sk2.sketch, amount=-CUT_EXTRUDE7_REACH, mode=Mode.PRIVATE) & part.part
    add(cut_extrude7_tool1.solids().sort_by_distance((-111.76, 0, 19.05))[0], mode=Mode.SUBTRACT)
    add(cut_extrude7_tool2.solids().sort_by_distance((-88.9, 0, 19.05))[0], mode=Mode.SUBTRACT)

    # Sketch9 → Cut-Extrude8 (cut, up to next)
    with BuildSketch(Plane(origin=(0, 25.4, 0), x_dir=(1, 0, 0), z_dir=(0, 1, 0)), mode=Mode.PRIVATE) as cut_extrude8_sk1:
        with Locations(Location((-2.54, -19.05, 0), (0, 0, 270))):
            Circle(SKETCH9_R)
    cut_extrude8_tool1 = extrude(cut_extrude8_sk1.sketch, amount=-CUT_EXTRUDE8_REACH, mode=Mode.PRIVATE) & part.part
    add(cut_extrude8_tool1.solids().sort_by_distance((-2.54, 25.4, 19.05))[0], mode=Mode.SUBTRACT)

    # Sketch10 → Cut-Extrude9 (cut, up to next)
    with BuildSketch(Plane(origin=(0, 0, 0), x_dir=(-1, 0, 0), z_dir=(0, -1, 0)), mode=Mode.PRIVATE) as cut_extrude9_sk1:
        with Locations(Location((2.54, -19.05, 0), (0, 0, 270))):
            Circle(SKETCH10_R)
    cut_extrude9_tool1 = extrude(cut_extrude9_sk1.sketch, amount=-CUT_EXTRUDE9_REACH, mode=Mode.PRIVATE) & part.part
    add(cut_extrude9_tool1.solids().sort_by_distance((-2.54, 0, 19.05))[0], mode=Mode.SUBTRACT)


solid = part.part
